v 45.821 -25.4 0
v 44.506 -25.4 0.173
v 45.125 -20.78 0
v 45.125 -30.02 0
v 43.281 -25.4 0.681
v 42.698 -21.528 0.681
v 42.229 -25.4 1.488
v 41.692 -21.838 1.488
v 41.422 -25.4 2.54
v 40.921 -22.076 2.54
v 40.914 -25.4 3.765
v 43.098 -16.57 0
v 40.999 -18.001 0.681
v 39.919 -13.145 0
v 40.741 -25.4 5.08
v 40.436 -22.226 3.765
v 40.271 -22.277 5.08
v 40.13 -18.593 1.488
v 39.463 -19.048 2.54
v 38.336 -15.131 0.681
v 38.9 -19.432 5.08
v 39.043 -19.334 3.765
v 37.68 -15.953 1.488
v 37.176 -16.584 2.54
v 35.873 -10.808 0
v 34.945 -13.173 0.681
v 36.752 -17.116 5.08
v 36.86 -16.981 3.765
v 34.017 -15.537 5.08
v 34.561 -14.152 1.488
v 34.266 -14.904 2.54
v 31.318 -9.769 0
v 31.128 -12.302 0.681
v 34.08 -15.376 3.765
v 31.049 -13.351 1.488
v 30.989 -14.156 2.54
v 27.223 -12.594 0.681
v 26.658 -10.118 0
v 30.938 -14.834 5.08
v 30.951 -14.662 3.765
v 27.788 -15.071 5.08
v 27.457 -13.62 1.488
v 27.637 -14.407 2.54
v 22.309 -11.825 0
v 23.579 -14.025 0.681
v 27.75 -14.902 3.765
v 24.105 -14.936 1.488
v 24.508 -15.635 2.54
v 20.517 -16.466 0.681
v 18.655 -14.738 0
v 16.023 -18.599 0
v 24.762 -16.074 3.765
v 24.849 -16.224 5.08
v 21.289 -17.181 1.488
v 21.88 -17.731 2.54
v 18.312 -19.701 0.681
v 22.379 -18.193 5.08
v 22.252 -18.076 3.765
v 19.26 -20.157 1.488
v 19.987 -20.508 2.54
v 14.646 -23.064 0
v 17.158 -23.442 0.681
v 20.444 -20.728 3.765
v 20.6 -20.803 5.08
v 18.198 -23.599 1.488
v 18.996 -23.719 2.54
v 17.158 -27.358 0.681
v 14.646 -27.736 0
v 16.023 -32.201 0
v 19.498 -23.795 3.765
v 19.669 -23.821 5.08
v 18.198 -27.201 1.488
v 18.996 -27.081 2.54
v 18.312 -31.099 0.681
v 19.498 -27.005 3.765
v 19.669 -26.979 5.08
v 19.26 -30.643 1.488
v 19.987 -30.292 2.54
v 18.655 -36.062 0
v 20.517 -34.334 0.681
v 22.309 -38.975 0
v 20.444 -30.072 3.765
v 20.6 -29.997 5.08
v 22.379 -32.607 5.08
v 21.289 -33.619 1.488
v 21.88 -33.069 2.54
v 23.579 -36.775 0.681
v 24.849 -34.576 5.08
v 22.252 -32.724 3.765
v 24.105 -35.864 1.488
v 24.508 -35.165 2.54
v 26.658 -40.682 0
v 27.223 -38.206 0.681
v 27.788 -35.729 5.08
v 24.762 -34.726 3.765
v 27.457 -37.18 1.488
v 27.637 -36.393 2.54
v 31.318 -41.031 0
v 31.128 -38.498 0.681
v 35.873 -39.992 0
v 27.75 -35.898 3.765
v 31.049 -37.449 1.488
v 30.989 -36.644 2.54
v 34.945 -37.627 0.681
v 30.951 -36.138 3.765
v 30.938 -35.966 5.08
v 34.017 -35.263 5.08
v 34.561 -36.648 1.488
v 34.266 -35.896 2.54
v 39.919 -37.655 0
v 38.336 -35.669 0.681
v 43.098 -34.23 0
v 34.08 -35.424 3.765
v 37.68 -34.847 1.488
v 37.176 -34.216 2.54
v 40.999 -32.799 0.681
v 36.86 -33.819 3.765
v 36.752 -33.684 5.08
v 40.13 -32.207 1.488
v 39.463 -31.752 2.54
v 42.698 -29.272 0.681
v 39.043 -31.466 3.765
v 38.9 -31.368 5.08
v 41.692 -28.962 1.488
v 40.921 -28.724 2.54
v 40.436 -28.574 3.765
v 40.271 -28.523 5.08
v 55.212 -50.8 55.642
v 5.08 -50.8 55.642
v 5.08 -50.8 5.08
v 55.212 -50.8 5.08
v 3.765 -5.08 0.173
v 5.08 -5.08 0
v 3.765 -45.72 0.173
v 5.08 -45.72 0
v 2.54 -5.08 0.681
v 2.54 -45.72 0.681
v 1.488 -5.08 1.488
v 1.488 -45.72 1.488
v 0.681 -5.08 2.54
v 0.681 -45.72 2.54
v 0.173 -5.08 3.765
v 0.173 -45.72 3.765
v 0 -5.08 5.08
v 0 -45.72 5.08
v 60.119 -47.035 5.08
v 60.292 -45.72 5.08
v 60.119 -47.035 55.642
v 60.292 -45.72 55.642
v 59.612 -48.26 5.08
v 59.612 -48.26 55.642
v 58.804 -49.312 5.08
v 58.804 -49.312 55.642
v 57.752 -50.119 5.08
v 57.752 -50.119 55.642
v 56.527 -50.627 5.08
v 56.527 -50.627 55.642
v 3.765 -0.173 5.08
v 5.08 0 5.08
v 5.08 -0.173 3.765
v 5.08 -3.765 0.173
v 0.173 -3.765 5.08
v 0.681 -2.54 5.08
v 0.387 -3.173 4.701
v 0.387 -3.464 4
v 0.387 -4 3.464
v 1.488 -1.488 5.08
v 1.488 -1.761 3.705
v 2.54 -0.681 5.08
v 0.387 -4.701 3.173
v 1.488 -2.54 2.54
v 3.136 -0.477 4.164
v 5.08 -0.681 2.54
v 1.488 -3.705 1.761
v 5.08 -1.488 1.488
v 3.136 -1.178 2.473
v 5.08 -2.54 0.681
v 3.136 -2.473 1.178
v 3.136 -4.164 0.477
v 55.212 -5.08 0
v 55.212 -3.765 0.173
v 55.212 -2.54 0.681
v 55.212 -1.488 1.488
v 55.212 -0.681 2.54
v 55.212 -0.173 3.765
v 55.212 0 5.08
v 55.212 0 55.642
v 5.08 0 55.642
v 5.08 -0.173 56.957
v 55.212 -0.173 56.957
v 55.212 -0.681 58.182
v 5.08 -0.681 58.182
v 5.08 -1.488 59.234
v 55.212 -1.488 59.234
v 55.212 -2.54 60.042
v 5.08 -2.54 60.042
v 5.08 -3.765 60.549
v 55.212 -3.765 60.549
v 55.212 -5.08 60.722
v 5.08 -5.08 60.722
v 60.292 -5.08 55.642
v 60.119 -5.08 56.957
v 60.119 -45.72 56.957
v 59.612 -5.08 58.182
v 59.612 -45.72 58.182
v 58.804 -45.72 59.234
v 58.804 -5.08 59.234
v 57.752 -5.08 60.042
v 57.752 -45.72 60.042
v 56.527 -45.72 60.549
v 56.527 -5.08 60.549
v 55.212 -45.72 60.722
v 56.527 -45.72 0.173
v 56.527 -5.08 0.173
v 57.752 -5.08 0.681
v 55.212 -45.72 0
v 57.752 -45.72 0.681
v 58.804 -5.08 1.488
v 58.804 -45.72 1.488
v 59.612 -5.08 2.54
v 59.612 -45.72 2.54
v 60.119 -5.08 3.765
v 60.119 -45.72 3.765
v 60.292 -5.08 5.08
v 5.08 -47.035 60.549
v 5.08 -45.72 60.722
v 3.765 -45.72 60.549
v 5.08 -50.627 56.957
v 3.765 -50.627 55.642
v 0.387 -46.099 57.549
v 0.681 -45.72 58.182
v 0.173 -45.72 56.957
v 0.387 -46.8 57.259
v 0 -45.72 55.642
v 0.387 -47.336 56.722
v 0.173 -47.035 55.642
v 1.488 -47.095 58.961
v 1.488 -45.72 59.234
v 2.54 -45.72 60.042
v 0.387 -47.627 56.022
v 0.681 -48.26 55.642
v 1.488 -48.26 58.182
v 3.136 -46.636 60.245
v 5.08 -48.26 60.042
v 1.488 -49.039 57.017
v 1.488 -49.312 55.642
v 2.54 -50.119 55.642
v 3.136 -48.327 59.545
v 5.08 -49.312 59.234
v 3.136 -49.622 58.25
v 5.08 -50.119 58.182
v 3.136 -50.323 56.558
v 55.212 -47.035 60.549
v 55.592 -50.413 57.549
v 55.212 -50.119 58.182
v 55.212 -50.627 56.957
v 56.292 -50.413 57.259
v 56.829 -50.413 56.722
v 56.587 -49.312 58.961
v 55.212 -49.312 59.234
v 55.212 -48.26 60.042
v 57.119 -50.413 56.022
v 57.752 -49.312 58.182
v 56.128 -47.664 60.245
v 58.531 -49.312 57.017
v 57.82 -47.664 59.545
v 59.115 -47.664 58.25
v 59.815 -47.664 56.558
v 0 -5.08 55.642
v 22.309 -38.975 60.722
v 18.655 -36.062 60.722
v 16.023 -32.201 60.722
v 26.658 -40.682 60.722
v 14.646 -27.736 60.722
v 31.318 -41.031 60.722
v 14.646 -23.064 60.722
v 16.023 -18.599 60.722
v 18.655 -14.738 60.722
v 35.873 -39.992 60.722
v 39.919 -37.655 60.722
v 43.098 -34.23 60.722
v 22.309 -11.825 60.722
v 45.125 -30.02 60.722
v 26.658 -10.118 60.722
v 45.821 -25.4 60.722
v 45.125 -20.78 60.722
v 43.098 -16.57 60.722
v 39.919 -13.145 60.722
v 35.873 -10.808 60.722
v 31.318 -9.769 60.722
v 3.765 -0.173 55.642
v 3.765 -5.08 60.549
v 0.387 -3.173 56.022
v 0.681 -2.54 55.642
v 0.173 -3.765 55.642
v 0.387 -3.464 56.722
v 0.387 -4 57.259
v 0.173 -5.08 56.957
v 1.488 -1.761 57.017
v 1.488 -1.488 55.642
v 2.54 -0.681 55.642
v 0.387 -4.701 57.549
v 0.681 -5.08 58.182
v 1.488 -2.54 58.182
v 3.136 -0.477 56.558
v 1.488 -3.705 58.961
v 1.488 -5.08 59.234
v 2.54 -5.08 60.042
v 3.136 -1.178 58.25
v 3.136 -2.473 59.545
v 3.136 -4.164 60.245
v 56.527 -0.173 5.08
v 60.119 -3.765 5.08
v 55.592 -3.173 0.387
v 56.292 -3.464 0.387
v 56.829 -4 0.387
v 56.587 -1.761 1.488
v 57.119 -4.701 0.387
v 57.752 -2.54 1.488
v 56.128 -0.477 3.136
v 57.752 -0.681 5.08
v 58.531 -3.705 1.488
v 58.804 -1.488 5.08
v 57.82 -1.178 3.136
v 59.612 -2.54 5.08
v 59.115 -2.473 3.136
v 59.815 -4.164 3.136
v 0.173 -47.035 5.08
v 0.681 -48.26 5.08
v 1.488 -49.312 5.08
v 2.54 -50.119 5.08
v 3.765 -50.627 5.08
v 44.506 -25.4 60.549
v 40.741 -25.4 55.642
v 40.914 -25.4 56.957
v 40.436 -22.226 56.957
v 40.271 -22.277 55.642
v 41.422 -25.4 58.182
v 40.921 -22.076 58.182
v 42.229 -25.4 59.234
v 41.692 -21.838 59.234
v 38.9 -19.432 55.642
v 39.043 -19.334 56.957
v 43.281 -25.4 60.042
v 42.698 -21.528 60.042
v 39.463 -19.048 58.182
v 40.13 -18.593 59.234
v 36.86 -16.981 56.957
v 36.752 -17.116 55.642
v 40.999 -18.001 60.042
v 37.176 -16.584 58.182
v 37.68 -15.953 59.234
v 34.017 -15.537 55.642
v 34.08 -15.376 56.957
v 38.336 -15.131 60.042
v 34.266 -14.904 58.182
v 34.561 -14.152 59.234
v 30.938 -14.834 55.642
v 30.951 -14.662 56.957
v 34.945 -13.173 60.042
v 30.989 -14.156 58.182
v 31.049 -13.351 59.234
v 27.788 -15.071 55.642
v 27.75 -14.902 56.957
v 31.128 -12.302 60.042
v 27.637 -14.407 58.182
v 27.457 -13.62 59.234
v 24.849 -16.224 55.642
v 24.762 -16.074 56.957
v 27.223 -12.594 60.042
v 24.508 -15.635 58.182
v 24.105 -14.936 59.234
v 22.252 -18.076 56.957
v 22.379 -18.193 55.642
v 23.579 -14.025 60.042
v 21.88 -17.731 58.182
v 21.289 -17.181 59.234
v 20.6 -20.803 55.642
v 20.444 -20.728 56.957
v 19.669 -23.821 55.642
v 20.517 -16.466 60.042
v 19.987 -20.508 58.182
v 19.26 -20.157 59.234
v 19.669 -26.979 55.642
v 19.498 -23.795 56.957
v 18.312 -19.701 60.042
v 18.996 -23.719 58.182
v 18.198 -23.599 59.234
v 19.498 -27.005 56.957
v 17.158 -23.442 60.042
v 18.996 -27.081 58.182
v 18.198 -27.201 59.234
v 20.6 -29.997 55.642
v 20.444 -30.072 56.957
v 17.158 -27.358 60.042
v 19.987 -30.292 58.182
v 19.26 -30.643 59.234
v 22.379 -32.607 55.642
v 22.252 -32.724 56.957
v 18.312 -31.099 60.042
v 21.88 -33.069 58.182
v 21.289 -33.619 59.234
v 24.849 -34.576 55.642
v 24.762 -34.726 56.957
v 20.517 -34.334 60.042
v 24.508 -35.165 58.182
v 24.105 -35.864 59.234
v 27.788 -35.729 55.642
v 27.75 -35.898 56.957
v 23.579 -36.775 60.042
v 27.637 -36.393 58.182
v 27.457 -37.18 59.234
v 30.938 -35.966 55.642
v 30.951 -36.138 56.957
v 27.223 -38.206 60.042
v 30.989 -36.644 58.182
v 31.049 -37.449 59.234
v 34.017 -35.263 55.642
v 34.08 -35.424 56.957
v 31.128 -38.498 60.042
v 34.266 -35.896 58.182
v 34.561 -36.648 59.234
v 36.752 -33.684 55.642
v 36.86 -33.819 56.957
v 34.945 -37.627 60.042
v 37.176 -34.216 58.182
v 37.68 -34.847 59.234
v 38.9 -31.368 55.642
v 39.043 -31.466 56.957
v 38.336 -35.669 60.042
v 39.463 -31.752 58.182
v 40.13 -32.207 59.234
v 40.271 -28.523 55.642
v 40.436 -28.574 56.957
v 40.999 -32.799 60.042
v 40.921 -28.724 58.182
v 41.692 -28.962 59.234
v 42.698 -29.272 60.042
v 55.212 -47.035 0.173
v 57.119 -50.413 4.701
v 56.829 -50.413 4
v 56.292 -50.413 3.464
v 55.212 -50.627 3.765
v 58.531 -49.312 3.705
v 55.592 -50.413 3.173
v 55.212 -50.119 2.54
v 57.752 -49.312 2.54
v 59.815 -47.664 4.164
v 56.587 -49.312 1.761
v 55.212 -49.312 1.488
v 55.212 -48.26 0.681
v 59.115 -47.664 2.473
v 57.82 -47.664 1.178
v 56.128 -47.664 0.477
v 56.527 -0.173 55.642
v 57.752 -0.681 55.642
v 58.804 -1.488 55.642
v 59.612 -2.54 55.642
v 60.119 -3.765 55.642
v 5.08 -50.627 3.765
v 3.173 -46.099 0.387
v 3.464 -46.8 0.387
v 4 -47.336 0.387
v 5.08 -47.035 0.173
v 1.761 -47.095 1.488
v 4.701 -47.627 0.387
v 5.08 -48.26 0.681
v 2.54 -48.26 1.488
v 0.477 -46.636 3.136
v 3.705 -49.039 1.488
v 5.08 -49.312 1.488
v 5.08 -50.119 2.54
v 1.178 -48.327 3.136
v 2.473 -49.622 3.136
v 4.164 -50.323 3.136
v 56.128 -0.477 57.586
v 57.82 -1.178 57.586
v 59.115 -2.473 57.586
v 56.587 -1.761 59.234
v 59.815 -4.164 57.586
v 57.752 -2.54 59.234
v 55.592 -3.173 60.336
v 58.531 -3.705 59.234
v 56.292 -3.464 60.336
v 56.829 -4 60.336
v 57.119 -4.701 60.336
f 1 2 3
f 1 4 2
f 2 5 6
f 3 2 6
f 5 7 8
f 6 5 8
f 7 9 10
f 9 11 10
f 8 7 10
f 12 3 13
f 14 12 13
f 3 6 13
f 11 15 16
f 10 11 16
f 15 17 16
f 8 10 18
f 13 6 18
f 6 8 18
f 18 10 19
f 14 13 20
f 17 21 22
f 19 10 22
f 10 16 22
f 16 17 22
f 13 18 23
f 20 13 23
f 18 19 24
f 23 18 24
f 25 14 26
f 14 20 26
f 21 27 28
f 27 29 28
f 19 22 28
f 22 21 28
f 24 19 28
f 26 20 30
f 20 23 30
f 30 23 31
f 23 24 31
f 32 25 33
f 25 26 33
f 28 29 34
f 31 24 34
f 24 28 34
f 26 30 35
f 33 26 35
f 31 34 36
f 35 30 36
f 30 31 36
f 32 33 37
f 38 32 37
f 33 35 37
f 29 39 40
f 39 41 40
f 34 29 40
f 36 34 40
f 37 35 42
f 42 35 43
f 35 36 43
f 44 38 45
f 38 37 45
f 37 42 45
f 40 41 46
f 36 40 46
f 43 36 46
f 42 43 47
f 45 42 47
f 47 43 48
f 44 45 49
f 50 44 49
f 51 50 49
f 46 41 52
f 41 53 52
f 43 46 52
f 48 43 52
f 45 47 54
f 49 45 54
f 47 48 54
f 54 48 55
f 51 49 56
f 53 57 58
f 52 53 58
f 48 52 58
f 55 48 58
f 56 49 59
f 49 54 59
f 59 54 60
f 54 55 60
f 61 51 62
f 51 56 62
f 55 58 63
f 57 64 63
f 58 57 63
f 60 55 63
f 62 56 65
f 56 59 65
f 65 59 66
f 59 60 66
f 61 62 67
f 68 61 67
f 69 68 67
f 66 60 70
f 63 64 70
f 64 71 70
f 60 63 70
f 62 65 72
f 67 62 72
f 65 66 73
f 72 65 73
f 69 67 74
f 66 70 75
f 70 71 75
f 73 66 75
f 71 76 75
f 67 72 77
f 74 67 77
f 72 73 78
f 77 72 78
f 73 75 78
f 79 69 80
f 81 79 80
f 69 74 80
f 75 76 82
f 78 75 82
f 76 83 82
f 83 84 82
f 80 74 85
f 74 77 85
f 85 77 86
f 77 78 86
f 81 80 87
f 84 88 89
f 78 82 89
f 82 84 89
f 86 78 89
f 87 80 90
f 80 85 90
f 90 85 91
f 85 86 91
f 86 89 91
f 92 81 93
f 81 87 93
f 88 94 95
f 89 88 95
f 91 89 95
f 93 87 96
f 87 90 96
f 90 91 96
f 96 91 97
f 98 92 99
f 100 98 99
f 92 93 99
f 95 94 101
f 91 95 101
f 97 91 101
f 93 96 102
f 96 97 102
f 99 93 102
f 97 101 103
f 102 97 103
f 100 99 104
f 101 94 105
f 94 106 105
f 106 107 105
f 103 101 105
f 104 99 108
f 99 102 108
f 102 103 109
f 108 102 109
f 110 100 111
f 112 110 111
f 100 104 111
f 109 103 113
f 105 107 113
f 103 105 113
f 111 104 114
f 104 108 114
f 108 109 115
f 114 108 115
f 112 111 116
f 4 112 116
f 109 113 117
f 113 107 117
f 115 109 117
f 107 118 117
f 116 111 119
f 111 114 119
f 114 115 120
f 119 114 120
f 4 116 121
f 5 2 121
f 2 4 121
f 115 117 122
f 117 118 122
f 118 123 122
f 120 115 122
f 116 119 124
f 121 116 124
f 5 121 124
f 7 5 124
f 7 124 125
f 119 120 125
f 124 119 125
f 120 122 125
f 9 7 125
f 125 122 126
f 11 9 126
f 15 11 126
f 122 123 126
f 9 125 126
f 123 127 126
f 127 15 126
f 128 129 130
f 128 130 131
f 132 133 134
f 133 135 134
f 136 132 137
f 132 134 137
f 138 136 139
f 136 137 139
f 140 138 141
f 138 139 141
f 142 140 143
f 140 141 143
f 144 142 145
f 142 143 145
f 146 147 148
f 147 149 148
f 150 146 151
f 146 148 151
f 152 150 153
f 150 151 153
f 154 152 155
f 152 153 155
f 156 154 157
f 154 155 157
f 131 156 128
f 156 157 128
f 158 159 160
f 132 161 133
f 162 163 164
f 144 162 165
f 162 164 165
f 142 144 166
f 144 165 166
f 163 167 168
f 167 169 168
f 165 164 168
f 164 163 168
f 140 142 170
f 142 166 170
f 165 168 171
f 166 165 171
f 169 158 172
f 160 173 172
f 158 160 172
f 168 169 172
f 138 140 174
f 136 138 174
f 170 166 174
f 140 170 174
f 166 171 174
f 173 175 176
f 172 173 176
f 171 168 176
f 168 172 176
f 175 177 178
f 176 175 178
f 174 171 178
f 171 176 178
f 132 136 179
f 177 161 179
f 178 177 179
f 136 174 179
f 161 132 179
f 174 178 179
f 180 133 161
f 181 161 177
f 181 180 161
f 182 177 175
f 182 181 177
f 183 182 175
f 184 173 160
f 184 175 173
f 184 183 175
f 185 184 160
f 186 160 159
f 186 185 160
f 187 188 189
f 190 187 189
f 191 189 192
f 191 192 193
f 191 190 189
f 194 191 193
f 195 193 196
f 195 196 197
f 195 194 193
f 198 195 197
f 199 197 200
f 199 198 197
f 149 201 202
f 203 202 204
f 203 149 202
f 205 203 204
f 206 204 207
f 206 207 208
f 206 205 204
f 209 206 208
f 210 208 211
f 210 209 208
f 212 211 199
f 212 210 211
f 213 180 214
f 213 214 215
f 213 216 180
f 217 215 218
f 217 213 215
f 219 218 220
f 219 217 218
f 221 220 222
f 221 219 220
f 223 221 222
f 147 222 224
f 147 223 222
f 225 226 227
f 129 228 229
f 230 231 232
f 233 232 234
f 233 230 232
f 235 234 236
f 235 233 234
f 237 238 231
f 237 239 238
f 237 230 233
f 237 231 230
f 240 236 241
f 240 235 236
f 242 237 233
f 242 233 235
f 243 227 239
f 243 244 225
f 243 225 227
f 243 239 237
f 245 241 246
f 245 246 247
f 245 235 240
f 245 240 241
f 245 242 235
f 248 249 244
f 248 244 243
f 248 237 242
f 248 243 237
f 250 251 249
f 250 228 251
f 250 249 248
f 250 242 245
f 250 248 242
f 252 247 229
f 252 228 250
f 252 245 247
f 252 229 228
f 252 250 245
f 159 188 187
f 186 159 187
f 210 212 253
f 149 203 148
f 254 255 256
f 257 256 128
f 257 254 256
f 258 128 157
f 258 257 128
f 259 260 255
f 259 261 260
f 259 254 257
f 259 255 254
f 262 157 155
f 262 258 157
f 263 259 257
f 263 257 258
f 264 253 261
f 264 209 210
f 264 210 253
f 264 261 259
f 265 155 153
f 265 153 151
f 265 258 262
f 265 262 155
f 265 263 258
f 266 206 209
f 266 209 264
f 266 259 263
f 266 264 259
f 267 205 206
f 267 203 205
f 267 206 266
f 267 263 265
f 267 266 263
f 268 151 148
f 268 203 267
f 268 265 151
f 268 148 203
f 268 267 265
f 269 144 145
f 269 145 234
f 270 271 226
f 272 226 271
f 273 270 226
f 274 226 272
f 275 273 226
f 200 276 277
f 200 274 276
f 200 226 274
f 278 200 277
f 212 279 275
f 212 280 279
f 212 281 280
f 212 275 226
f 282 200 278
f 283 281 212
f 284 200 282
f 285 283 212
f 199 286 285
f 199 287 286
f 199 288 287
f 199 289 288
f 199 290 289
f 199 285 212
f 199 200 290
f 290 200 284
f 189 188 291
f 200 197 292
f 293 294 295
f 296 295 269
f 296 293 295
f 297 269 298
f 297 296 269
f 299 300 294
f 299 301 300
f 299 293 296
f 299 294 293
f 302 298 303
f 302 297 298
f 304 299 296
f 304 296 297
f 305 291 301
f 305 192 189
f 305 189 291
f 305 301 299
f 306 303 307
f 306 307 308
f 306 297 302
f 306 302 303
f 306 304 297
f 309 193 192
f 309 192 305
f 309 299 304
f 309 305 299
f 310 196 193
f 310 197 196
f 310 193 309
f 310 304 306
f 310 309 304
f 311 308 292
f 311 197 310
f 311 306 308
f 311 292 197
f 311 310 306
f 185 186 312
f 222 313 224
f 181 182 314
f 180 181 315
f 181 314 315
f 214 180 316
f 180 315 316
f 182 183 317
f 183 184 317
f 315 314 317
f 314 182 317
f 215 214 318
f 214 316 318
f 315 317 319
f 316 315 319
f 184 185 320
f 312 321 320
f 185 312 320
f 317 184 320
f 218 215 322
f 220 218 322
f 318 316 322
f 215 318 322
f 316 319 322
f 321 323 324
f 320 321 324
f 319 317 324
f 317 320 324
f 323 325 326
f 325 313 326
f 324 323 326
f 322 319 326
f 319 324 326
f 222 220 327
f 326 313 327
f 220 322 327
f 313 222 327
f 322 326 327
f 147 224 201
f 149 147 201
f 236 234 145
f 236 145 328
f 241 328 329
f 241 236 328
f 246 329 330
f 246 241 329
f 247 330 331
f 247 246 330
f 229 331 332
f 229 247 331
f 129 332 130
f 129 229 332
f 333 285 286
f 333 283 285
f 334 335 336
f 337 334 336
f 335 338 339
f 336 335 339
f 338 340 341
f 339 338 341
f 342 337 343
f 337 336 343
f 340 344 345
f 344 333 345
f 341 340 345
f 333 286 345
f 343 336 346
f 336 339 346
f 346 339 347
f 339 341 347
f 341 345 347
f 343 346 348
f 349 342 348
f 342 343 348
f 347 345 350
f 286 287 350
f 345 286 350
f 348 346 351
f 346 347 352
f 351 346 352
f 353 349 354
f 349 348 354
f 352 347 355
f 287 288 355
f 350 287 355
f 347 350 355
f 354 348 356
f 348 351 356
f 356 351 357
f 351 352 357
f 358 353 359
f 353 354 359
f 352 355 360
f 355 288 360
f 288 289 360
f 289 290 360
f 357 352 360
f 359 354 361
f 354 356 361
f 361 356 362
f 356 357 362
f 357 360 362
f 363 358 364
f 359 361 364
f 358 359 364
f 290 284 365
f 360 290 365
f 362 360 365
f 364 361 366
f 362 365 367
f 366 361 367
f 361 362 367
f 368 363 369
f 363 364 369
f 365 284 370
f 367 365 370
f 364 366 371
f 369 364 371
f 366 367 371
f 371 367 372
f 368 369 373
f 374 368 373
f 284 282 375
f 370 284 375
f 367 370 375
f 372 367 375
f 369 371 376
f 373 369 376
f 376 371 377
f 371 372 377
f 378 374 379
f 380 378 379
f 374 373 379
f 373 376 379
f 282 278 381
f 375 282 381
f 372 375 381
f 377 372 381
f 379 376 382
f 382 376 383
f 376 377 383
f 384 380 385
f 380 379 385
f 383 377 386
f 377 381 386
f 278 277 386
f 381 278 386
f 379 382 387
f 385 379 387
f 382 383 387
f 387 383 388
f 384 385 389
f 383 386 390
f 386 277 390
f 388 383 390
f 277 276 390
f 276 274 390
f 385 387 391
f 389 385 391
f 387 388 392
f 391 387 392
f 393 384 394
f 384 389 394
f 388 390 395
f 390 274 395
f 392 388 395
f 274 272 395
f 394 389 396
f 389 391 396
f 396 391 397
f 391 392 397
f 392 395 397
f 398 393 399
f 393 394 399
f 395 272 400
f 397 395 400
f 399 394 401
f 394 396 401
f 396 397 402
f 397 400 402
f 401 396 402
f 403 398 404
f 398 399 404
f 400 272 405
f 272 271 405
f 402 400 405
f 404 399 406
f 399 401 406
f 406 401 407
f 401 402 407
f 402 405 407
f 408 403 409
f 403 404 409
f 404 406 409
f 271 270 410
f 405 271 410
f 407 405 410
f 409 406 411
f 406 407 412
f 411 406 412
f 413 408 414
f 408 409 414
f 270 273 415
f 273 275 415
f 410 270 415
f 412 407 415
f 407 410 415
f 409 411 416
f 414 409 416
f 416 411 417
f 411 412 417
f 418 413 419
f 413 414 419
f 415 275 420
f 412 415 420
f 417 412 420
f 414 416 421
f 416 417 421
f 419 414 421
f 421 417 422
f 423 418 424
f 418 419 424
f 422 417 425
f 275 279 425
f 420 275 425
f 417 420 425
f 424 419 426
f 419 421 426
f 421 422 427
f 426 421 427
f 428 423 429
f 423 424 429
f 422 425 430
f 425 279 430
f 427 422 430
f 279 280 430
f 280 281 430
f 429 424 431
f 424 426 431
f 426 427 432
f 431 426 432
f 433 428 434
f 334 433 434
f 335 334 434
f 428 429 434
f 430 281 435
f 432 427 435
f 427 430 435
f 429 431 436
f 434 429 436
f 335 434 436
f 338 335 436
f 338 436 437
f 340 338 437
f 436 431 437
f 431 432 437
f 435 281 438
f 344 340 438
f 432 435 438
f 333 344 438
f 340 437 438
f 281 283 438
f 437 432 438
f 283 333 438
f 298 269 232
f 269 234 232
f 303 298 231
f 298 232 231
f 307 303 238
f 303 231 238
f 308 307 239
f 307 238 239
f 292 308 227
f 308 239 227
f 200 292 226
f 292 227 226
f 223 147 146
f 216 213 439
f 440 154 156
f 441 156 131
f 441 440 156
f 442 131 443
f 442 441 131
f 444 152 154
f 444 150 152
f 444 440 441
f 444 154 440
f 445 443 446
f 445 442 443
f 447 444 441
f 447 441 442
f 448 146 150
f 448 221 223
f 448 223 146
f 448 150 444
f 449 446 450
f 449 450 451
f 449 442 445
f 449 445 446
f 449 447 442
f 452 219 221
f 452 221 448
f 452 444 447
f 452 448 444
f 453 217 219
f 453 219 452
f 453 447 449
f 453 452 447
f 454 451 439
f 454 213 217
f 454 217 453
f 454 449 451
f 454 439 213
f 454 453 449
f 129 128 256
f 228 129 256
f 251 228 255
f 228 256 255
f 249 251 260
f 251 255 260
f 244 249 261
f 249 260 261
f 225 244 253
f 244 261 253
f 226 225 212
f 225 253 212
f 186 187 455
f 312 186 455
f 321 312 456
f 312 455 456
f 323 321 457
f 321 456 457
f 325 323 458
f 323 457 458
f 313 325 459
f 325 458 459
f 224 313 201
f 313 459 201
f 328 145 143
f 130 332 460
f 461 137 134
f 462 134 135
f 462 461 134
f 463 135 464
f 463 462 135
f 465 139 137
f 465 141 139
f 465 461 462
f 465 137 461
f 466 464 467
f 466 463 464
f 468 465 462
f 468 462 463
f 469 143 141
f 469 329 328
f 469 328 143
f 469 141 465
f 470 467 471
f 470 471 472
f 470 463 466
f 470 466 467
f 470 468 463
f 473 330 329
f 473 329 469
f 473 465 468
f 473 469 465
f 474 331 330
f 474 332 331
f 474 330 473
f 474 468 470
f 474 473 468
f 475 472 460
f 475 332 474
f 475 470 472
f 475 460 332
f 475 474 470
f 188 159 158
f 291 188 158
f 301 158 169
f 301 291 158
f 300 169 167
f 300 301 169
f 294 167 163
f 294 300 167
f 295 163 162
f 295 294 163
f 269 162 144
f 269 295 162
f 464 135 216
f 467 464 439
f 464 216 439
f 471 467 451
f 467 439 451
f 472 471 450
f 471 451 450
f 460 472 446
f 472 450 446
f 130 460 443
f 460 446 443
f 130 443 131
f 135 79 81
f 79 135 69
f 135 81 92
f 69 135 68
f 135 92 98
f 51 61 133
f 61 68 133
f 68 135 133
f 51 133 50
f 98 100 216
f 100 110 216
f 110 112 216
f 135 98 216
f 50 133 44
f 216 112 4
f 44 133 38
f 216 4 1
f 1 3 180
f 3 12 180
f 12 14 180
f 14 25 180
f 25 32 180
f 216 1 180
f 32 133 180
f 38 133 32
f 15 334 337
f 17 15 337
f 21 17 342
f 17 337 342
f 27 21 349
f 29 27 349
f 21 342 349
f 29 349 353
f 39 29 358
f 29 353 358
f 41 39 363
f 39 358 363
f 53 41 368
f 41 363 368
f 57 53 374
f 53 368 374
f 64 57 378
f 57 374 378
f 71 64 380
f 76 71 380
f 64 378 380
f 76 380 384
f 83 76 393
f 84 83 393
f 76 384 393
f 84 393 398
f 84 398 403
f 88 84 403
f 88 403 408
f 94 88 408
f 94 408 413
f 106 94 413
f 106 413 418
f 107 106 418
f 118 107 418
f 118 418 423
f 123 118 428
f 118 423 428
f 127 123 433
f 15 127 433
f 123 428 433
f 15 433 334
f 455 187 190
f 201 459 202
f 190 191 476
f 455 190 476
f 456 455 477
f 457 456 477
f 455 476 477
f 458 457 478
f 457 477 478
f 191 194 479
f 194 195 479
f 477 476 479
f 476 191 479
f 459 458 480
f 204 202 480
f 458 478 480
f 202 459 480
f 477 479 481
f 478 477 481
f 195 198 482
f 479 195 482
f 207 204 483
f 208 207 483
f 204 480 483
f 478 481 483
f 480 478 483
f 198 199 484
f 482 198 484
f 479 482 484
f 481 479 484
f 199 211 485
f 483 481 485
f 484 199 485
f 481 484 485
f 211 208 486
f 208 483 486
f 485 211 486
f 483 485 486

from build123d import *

# Parameters (mm, degrees)
F0_W     = 60.2922588587
F0_H     = 60.7222765684
F1_DEPTH = 50.8
F2_R     = 10.5951307647
F3_DEPTH = 60.7222765684
F4_R     = 5.08
F5_R     = 5.08


with BuildPart() as f1:
    # F0 (on Front) → F1 (new body)
    with BuildSketch(Plane.XZ):
        with Locations((30.1461294293, 30.3611382842)):
            Rectangle(F0_W, F0_H)
    extrude(amount=F1_DEPTH)

    # F2 (on face) → F3 (cut, through all)
    with BuildSketch(Plane.XY.offset(60.7222765684)):
        with Locations((30.1461294293, -25.4)):
            Circle(F2_R)
    extrude(amount=-F3_DEPTH, mode=Mode.SUBTRACT)

    # F4
    f4_edges = [f1.edges().sort_by_distance(p)[0] for p in [
        (60.292259, 0, 30.361138),
    ]]
    fillet(f4_edges, radius=F4_R)

    # F5
    f5_edges = [f1.edges().sort_by_distance(p)[0] for p in [
        (27.606129, 0, 60.722277),
        (27.606129, 0, 0),
        (0, 0, 30.361138),
        (19.550999, -25.4, 60.722277),
        (30.146129, -50.8, 60.722277),
        (0, -25.4, 60.722277),
        (0, -50.8, 30.361138),
        (0, -25.4, 0),
        (60.292259, -27.94, 0),
        (60.292259, -5.08, 30.361138),
        (60.292259, -50.8, 30.361138),
        (60.292259, -27.94, 60.722277),
        (58.804361, -1.487898, 0),
        (30.146129, -50.8, 0),
        (19.550999, -25.4, 0),
    ]]
    fillet(f5_edges, radius=F5_R)


solid = f1.part
